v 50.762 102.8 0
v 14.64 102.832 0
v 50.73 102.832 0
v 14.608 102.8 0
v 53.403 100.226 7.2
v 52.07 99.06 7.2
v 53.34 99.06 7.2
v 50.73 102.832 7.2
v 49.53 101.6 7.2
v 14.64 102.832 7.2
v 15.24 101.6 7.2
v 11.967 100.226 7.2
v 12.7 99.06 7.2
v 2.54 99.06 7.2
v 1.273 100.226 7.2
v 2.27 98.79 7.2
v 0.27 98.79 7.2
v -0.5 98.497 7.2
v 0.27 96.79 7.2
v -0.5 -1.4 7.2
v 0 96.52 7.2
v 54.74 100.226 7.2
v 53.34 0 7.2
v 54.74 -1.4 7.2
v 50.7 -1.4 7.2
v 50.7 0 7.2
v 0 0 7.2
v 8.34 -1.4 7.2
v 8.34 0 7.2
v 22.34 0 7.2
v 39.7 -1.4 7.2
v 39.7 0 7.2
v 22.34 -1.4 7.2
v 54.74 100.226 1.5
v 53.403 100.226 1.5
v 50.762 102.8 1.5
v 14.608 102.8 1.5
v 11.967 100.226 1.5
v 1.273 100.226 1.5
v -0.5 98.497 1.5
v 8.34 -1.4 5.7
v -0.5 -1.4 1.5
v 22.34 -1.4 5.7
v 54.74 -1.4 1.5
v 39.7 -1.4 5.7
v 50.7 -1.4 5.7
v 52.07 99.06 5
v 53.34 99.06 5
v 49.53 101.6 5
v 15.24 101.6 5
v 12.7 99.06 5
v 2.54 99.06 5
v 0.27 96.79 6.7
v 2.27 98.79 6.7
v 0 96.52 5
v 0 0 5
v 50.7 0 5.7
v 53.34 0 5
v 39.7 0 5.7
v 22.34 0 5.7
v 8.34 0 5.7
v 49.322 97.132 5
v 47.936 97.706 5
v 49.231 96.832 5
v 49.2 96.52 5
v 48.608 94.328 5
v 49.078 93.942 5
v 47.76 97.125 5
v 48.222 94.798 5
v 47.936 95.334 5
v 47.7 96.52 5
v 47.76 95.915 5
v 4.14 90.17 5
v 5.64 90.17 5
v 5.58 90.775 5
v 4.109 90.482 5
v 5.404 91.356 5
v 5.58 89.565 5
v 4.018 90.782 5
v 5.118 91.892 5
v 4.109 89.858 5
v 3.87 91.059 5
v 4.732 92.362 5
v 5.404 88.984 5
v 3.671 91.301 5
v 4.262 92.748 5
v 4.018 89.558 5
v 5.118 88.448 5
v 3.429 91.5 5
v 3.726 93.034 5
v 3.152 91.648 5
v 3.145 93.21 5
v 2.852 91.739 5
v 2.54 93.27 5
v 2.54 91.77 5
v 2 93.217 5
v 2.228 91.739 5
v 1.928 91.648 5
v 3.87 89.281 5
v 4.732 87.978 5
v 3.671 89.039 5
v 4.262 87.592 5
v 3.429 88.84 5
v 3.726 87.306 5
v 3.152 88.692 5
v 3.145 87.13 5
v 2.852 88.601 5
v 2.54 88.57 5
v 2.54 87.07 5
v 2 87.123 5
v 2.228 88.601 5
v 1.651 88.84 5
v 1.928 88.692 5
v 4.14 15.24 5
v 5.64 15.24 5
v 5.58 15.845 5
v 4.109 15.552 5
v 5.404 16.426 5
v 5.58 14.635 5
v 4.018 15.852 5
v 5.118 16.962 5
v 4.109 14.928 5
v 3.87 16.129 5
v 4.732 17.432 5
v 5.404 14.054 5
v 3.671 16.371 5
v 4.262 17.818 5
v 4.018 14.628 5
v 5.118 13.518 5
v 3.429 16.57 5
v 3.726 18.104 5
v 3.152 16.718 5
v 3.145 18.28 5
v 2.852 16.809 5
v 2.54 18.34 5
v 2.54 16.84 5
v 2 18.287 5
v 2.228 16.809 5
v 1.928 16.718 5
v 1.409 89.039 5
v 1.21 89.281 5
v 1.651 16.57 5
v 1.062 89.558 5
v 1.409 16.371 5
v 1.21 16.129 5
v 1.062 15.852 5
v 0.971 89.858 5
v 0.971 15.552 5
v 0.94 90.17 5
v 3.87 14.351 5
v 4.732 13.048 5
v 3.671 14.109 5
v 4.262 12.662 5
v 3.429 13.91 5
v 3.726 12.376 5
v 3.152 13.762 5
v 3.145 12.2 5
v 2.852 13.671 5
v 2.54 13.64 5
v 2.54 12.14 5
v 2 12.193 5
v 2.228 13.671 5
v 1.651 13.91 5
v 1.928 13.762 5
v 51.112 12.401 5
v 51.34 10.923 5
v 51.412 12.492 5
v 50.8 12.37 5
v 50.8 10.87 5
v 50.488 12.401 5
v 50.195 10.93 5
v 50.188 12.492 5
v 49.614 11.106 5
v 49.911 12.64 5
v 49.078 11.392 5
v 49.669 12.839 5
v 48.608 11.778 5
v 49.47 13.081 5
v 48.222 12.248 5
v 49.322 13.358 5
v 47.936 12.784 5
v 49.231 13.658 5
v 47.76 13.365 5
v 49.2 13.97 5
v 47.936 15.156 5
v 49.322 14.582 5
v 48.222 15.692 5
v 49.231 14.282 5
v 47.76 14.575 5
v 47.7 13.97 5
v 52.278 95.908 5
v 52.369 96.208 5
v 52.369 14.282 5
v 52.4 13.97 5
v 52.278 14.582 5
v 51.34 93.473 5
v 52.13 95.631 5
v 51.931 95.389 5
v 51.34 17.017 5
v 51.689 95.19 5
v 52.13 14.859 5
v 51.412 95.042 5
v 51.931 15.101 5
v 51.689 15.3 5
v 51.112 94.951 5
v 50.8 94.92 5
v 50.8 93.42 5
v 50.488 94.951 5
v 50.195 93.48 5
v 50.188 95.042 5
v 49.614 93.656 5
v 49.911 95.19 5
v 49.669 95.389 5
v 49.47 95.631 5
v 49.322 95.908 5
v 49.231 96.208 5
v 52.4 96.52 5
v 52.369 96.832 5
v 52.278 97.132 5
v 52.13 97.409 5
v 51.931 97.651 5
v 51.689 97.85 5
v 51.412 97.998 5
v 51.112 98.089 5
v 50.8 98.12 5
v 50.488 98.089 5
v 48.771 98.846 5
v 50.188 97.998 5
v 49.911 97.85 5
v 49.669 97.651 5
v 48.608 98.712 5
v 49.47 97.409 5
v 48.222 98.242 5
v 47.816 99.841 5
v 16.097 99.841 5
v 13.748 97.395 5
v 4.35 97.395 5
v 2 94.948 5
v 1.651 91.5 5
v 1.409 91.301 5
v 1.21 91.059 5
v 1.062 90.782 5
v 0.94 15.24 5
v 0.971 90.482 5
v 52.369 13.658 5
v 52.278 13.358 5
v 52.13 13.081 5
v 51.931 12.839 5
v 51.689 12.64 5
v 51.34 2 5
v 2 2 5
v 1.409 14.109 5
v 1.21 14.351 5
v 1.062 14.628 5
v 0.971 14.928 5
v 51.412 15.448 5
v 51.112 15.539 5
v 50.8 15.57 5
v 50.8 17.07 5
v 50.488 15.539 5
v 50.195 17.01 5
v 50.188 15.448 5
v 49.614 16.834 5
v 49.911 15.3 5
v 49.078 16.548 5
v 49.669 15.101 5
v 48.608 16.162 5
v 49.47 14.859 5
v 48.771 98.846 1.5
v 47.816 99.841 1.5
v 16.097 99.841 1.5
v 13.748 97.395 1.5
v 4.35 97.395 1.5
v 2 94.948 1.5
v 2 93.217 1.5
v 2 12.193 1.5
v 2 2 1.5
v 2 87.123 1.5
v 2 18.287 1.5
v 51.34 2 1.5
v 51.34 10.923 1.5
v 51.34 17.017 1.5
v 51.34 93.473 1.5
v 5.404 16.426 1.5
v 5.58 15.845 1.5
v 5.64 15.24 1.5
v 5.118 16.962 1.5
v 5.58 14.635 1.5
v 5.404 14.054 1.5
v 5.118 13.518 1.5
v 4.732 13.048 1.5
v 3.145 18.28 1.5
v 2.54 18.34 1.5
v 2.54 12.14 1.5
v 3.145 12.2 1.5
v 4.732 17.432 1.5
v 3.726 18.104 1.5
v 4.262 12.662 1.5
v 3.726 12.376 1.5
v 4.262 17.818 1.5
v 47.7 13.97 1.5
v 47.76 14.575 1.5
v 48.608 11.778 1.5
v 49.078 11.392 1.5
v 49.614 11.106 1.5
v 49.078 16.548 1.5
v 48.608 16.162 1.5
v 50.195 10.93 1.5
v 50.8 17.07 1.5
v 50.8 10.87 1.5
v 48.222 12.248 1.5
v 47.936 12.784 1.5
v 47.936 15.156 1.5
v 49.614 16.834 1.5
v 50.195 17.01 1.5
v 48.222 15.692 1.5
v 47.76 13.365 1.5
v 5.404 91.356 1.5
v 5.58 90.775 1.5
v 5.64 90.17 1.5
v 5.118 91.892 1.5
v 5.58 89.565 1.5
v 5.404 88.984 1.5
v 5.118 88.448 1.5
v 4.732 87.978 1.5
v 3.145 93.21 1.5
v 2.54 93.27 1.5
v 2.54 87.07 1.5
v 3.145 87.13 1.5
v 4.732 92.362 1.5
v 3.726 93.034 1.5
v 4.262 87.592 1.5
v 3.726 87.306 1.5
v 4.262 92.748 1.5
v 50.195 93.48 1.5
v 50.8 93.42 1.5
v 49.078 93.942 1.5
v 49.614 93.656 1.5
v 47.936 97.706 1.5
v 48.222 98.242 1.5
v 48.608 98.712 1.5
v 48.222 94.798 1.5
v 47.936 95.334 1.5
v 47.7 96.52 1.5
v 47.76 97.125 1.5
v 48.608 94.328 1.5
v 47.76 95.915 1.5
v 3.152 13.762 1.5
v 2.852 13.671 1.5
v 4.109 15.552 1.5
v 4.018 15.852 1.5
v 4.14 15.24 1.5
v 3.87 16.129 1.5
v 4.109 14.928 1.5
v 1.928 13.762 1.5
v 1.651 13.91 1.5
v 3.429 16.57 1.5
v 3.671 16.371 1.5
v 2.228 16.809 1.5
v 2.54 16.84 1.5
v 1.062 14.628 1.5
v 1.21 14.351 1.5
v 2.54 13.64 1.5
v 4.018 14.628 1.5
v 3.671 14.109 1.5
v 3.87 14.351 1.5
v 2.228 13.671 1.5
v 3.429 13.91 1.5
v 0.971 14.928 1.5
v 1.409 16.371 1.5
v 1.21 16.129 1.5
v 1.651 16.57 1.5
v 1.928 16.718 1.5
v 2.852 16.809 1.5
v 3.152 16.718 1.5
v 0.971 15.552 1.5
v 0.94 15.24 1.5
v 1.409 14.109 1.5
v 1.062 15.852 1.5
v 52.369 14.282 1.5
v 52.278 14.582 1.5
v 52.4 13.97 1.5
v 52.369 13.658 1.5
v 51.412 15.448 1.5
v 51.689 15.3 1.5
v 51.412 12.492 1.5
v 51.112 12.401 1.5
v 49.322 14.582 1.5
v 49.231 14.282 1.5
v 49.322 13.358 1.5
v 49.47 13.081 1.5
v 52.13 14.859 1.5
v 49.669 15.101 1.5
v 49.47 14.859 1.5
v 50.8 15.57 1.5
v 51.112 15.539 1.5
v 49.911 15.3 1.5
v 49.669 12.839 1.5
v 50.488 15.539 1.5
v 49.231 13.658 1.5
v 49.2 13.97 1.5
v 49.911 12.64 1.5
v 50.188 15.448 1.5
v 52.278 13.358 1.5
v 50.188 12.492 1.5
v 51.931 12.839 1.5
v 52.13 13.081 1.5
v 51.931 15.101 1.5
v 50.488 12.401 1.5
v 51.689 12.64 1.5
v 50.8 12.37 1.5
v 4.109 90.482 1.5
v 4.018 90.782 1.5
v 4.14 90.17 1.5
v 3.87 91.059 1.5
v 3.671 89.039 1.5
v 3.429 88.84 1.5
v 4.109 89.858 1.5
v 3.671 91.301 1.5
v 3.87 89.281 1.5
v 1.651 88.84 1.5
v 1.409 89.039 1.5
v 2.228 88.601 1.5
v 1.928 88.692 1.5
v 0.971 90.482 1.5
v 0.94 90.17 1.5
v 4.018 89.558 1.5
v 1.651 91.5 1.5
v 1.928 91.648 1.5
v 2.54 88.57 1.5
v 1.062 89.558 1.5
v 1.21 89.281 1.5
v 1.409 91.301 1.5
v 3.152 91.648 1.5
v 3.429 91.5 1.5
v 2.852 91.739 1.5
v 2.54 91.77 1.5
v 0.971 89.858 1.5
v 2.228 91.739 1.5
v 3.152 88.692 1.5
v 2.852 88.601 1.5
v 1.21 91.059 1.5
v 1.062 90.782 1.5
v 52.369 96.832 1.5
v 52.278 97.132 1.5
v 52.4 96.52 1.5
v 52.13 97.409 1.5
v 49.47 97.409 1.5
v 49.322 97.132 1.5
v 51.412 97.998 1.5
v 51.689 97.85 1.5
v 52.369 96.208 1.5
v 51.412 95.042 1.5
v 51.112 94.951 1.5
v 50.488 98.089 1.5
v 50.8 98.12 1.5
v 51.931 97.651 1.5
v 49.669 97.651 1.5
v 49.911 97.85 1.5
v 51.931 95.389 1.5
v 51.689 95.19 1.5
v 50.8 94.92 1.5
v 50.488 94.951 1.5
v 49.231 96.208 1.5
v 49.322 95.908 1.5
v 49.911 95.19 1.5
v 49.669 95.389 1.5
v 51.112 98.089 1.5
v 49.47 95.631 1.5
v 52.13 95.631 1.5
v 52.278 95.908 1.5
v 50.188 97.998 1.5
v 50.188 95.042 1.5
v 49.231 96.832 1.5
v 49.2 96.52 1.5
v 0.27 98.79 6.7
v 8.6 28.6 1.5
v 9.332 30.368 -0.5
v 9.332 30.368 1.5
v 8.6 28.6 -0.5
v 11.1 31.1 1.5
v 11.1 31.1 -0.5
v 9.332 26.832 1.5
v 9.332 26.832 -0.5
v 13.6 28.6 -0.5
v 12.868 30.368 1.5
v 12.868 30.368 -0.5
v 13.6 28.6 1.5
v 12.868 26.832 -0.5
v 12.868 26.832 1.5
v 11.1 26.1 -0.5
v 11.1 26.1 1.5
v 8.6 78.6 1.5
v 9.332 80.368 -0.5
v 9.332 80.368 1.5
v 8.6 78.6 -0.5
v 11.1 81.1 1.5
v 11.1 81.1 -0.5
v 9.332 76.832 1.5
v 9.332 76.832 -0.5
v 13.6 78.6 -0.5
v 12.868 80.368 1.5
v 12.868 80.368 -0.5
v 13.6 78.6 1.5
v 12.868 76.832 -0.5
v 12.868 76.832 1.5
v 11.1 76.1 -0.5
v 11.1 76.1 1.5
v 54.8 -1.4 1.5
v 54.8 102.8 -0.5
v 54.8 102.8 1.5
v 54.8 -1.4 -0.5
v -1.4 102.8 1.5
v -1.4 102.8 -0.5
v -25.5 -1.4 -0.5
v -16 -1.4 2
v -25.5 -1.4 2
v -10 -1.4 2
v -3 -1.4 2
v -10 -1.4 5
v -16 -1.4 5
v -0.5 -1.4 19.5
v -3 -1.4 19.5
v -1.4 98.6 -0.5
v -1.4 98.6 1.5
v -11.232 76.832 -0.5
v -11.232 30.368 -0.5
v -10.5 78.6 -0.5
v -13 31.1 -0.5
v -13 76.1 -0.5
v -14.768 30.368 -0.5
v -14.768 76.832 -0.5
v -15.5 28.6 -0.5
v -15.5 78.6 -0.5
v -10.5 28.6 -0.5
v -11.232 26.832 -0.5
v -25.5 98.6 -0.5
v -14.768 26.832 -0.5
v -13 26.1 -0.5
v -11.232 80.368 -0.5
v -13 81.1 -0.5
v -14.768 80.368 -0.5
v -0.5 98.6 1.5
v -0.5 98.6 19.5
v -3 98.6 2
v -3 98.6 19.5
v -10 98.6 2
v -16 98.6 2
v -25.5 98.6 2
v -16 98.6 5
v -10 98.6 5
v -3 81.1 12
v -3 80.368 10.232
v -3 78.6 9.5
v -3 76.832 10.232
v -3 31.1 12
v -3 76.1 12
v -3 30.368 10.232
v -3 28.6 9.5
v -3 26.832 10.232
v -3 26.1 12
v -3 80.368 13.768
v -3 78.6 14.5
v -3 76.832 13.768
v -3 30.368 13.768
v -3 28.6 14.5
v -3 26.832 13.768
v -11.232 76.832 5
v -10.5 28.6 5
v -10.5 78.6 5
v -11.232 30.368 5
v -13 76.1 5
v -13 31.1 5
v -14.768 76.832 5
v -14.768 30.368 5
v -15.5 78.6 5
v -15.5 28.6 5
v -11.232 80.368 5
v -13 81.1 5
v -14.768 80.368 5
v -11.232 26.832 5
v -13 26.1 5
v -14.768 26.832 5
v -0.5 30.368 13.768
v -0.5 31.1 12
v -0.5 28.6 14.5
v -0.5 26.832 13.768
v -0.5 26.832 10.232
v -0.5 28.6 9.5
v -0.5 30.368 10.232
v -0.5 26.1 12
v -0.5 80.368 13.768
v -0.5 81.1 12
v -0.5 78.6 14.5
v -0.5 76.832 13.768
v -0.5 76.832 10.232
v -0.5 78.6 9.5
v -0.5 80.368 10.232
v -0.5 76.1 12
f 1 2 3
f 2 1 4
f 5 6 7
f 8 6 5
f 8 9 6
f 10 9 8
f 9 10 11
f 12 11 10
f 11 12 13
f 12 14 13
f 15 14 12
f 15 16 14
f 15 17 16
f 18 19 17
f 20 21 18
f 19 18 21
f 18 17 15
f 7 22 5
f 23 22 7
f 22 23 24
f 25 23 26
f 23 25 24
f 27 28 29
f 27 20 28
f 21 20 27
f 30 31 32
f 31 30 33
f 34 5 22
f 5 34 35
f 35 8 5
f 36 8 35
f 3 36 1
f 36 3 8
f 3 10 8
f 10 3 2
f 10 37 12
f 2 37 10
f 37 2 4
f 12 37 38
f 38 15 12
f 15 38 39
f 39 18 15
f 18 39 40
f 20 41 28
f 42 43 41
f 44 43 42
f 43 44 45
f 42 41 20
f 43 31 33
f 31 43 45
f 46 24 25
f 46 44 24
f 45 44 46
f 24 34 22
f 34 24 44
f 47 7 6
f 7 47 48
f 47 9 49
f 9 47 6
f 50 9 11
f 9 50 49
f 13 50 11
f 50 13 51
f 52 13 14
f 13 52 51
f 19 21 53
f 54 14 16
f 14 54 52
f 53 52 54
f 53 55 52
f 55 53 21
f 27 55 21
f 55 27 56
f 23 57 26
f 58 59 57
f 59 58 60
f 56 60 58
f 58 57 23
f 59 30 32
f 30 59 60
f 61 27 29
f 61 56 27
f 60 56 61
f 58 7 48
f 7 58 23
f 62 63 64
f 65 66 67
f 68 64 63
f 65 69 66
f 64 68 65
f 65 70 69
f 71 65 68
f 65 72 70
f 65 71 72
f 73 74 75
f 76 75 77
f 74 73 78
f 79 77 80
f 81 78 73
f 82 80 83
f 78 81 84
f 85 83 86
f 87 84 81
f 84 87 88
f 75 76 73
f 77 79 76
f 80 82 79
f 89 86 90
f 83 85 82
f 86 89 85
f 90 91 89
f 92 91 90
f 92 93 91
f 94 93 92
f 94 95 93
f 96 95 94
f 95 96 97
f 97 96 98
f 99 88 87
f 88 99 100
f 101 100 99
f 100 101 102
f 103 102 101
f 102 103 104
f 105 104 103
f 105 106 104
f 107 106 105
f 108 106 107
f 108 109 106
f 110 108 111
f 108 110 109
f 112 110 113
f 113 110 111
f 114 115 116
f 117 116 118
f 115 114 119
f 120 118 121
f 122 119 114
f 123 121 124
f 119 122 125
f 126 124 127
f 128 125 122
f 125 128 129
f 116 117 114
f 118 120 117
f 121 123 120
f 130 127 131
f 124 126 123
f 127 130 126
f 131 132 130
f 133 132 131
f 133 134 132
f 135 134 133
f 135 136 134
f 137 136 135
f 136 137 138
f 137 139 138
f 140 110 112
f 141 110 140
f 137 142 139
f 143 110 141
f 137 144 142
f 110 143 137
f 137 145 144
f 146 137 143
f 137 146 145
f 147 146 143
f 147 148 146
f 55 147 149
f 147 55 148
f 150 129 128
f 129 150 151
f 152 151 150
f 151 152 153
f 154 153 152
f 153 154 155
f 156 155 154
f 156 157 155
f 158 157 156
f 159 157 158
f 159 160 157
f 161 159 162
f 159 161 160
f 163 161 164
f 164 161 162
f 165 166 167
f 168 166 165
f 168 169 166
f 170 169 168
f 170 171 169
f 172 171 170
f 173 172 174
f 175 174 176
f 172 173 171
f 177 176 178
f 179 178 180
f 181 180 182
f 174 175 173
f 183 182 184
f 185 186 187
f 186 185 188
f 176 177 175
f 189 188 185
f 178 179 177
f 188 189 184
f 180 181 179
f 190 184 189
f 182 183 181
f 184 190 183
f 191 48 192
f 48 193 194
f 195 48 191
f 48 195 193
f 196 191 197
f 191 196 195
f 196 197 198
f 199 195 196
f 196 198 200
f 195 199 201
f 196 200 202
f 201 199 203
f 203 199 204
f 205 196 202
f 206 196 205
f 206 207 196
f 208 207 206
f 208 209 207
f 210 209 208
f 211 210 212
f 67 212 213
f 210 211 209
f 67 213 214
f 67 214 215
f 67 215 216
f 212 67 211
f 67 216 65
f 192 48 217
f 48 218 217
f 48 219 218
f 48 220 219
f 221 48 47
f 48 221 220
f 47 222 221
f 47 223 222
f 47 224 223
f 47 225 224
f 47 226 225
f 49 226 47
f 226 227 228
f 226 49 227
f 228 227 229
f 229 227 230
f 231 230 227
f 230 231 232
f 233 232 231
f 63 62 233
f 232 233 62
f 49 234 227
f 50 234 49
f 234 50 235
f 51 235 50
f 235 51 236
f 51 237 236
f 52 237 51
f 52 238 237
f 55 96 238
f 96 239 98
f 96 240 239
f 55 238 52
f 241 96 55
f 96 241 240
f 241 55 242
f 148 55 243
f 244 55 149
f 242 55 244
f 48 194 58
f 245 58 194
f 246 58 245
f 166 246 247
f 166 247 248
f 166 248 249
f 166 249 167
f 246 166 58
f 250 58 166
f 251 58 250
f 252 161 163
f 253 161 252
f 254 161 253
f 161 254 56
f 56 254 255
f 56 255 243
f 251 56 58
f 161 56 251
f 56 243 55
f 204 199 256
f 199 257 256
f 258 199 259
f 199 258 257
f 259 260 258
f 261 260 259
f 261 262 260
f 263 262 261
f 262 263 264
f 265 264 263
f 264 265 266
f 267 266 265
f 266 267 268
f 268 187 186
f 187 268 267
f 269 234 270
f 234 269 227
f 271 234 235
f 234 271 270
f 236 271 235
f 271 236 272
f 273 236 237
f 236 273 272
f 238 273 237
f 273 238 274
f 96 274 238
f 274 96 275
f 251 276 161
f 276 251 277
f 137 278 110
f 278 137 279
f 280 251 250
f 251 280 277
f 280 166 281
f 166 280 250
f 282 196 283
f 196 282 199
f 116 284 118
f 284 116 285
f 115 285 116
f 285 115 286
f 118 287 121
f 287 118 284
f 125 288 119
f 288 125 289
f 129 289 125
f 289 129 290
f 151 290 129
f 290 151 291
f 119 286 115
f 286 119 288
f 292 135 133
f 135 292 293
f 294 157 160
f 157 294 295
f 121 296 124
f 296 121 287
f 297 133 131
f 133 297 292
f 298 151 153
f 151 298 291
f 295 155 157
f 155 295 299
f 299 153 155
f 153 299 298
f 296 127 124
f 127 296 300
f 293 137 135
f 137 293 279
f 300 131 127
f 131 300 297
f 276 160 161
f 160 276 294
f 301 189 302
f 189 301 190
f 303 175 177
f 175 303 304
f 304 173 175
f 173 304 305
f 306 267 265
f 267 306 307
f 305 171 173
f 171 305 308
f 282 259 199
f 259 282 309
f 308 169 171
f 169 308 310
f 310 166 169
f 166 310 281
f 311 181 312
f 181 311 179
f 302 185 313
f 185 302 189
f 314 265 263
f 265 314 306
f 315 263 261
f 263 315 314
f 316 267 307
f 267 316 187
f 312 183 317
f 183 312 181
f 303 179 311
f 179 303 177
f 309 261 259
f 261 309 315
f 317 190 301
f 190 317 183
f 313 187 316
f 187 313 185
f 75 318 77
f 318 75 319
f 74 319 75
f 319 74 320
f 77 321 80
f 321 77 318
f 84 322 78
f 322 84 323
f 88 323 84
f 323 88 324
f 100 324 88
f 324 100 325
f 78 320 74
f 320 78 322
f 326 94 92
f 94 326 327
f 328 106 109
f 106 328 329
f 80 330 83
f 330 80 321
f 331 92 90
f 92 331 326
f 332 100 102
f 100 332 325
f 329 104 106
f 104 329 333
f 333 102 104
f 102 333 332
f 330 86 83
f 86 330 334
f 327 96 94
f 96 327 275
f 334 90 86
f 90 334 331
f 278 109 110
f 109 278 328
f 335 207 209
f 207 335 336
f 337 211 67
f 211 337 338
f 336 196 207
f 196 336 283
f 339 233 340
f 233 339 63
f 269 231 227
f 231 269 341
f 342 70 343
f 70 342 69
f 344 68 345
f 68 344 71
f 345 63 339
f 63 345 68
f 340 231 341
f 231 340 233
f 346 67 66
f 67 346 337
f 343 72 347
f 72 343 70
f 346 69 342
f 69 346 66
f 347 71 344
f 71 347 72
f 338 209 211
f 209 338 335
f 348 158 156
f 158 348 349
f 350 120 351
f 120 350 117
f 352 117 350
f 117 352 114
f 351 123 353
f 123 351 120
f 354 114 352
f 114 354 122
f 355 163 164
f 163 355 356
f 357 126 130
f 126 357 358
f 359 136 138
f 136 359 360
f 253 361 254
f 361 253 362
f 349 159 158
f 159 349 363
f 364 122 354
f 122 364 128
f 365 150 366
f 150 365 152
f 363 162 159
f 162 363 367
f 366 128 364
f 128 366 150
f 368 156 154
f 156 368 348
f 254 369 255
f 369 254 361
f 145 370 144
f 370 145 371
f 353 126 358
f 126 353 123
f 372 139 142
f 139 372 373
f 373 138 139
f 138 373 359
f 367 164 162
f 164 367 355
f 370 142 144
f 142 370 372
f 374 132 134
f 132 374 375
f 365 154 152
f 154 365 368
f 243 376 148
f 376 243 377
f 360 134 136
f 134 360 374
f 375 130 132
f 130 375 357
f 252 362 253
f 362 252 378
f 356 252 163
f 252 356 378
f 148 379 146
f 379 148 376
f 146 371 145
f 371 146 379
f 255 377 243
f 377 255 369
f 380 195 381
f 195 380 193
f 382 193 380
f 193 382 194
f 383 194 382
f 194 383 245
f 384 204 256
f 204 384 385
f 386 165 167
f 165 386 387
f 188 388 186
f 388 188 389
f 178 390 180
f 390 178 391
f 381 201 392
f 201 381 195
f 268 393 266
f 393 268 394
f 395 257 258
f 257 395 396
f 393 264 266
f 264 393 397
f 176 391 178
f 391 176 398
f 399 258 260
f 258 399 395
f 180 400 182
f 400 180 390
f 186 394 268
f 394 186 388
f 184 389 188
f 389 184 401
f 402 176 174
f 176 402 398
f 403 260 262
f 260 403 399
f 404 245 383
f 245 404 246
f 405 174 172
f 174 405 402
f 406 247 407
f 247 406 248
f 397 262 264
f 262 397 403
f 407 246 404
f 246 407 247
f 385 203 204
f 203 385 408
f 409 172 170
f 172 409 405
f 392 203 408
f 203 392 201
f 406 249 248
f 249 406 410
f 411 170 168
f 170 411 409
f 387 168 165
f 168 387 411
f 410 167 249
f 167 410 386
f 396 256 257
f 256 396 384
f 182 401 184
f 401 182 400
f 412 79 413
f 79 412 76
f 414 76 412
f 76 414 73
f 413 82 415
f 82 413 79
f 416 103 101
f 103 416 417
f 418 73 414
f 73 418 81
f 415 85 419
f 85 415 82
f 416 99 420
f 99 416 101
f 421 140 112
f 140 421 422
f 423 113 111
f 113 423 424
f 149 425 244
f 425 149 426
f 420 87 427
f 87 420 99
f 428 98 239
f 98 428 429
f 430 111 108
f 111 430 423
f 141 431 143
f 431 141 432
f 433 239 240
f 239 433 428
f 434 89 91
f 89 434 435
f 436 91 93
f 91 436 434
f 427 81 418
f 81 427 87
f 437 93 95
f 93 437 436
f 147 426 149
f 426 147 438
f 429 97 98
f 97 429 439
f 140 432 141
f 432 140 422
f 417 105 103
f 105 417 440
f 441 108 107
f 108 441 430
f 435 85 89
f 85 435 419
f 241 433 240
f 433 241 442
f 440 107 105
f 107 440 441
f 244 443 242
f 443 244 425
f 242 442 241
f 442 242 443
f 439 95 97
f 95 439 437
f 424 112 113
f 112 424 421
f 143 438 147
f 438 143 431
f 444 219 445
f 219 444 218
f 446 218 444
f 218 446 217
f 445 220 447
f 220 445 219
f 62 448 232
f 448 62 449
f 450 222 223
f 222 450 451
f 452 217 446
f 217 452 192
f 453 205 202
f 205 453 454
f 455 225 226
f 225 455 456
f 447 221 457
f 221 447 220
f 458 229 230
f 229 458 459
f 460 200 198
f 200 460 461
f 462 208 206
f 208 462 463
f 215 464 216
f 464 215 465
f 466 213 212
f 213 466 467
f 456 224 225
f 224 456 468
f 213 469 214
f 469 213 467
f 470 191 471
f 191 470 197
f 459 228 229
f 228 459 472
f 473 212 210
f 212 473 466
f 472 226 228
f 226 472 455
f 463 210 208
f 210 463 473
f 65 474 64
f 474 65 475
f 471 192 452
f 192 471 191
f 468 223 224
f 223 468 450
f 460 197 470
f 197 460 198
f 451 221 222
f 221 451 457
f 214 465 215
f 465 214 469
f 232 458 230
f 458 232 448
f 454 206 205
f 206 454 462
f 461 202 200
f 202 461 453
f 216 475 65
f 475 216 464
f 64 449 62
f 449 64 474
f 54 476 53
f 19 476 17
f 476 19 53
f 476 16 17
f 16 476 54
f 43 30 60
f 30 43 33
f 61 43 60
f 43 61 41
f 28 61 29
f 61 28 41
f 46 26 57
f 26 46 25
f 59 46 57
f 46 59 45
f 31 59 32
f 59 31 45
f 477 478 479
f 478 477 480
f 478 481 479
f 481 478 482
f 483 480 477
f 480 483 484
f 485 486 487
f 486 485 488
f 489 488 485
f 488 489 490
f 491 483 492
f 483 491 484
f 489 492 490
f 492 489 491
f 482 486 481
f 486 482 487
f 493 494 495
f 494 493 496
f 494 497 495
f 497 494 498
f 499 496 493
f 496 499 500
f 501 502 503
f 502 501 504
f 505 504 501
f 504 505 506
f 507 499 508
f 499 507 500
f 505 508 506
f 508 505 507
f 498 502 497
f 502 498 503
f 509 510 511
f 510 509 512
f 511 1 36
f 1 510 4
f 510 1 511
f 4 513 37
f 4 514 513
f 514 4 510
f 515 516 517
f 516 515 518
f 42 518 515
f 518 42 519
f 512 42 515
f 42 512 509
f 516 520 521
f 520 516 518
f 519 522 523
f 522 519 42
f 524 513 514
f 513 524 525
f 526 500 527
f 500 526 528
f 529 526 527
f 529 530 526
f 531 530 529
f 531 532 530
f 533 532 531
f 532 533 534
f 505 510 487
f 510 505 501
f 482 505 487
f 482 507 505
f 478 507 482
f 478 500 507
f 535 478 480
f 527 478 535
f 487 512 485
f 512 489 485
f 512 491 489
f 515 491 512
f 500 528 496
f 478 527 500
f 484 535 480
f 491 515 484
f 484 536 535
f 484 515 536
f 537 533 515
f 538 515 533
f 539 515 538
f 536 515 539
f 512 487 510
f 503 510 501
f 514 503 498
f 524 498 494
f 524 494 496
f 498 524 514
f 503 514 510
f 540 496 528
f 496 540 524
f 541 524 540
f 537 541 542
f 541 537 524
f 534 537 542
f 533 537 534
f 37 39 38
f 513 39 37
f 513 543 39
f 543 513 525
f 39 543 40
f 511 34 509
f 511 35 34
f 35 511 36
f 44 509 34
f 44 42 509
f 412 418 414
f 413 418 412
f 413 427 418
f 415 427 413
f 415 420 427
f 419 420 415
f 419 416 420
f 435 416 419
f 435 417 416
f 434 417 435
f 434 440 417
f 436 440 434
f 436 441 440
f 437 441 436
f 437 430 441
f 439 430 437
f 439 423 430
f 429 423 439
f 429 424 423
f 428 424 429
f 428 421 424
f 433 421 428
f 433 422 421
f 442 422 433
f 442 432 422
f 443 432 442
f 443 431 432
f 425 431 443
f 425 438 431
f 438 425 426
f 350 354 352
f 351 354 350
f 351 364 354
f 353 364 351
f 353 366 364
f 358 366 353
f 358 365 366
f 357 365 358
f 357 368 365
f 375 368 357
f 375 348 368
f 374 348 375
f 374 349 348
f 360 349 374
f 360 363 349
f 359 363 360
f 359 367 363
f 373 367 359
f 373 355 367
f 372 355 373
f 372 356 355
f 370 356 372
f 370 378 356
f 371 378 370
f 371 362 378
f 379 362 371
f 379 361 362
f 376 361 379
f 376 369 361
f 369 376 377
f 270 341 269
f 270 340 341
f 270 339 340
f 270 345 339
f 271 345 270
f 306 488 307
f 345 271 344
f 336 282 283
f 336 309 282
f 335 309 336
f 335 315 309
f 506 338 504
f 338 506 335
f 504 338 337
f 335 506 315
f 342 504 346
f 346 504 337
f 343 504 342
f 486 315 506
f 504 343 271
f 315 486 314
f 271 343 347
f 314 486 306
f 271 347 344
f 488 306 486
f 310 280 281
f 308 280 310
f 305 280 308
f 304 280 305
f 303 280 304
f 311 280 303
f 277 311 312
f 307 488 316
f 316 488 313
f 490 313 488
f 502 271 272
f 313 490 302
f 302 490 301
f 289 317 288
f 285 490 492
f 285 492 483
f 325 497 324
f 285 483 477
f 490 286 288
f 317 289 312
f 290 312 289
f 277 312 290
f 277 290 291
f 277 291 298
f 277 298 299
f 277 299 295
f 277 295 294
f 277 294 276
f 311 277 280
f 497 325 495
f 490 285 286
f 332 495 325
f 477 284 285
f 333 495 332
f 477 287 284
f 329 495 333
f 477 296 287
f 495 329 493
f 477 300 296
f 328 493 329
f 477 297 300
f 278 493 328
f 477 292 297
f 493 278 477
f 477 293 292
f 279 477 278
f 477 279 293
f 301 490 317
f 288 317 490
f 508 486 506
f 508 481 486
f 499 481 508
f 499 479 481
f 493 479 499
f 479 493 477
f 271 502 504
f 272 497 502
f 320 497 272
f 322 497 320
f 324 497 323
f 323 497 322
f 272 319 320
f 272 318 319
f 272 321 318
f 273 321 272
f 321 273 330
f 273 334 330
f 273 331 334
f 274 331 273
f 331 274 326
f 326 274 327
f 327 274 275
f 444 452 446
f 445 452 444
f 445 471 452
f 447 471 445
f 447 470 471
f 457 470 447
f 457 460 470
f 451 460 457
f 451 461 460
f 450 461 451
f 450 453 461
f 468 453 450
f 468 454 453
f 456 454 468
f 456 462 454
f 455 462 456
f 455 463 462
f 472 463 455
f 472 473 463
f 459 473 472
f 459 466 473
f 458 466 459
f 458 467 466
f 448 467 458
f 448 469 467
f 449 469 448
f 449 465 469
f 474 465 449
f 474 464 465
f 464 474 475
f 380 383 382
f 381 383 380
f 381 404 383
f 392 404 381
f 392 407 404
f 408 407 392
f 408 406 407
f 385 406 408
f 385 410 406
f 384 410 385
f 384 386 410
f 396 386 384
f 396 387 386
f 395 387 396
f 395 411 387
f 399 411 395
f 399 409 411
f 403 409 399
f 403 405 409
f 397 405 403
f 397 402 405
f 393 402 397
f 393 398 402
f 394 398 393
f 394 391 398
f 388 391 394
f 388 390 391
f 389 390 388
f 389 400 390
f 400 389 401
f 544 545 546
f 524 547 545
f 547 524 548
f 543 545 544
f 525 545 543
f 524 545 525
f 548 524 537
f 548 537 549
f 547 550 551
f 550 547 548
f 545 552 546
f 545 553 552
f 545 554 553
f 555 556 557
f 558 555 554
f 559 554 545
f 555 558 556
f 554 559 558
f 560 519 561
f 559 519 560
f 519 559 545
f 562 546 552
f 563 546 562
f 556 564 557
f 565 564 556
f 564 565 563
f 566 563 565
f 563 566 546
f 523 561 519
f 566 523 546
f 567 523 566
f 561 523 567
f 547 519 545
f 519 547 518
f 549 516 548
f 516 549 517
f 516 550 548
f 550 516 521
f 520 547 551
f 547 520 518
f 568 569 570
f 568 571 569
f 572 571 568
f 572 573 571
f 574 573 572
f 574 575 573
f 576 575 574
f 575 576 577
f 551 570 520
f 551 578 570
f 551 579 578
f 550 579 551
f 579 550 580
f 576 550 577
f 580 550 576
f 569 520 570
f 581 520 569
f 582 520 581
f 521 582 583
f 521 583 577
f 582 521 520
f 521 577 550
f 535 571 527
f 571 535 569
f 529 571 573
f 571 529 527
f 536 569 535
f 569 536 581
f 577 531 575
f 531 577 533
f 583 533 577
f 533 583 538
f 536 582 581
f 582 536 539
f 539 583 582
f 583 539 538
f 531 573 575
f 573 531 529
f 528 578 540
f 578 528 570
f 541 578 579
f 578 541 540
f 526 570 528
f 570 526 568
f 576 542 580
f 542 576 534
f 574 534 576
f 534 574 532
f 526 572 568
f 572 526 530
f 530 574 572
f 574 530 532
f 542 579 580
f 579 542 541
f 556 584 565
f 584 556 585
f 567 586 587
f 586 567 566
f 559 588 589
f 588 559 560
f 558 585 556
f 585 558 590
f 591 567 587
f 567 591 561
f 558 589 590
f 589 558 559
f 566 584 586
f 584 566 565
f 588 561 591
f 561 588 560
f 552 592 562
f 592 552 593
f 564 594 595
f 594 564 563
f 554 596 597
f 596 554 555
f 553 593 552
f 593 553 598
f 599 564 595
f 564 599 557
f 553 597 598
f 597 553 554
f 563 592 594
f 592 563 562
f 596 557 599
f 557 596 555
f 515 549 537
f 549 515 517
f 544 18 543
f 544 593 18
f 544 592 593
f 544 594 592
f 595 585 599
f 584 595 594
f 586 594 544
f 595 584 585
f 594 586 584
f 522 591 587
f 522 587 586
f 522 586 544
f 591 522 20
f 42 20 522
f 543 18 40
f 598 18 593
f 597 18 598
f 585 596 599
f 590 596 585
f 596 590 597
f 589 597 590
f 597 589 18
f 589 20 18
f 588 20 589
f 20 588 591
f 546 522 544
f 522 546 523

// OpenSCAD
// file: inc/pins.scad
// Pin Connectors V3
// Tony Buser <tbuser@gmail.com>
// Modified by Emmett Lalish

object=0;//[0:pin,1:pinpeg,2:pinhole]
length=20;
diameter=8;
//Only affects pinhole
hole_twist=0;//[0:free,1:fixed]
//Only affects pinhole
hole_friction=0;//[0:loose,1:tight]
//Radial gap to help pins fit into tight holes
pin_tolerance=0.2;
//Extra gap to make loose hole
loose=0.3;
lip_height=3;
lip_thickness=1;
hf=hole_friction==0 ? false : true;
ht=hole_twist==0 ? false : true;

if(object==0)pin(h=length,r=diameter/2,lh=lip_height,lt=lip_thickness,t=pin_tolerance);
if(object==1)pinpeg(h=length,r=diameter/2,lh=lip_height,lt=lip_thickness,t=pin_tolerance);
if(object==2)pinhole(h=length,r=diameter/2,lh=lip_height,lt=lip_thickness,t=loose,
	tight=hf,fixed=ht);

module test() {
  tolerance = 0.3;
  
  translate([-12, 12, 0]) pinpeg(h=20);
  translate([12, 12, 0]) pintack(h=10);
  
  difference() {
    union() {
      translate([0, -12, 2.5]) cube(size = [59, 20, 5], center = true);
      translate([24, -12, 7.5]) cube(size = [12, 20, 15], center = true);
    }
    translate([-24, -12, 0]) pinhole(h=5, t=tolerance);
    translate([-12, -12, 0]) pinhole(h=5, t=tolerance, tight=false);
    translate([0, -12, 0]) pinhole(h=10, t=tolerance);
    translate([12, -12, 0]) pinhole(h=10, t=tolerance, tight=false);
    translate([24, -12, 15]) rotate([0, 180, 0]) pinhole(h=10, t=tolerance);
  }
}

module pinhole(h=10, r=4, lh=3, lt=1, t=0.3, tight=true, fixed=false) {
  // h = shaft height
  // r = shaft radius
  // lh = lip height
  // lt = lip thickness
  // t = extra tolerance for loose fit
  // tight = set to false if you want a joint that spins easily
  // fixed = set to true so pins can't spin
  
intersection(){
  union() {
	if (tight == true || fixed == true) {
      pin_solid(h, r, lh, lt);
	  translate([0,0,-t/2])cylinder(h=h+t, r=r, $fn=30);
	} else {
	  pin_solid(h, r+t/2, lh, lt);
	  translate([0,0,-t/2])cylinder(h=h+t, r=r+t/2, $fn=30);
	}
    
    
    // widen the entrance hole to make insertion easier
    //translate([0, 0, -0.1]) cylinder(h=lh/3, r2=r, r1=r+(t/2)+(lt/2),$fn=30);
  }
  if (fixed == true) {
	translate([-r*2, -r*0.75, -1])cube([r*4, r*1.5, h+2]);
  }
}}

module pin(h=10, r=4, lh=3, lt=1, t=0.2, side=false) {
  // h = shaft height
  // r = shaft radius
  // lh = lip height
  // lt = lip thickness
  // side = set to true if you want it printed horizontally

  if (side) {
    pin_horizontal(h, r, lh, lt, t);
  } else {
    //pin_vertical(h, r, lh, lt, t);
  }
}

module pintack(h=10, r=4, lh=3, lt=1, t=0.2, bh=3, br=8.75) {
  // bh = base_height
  // br = base_radius
  
  union() {
    cylinder(h=bh, r=br);
    translate([0, 0, bh]) pin(h, r, lh, lt, t);
  }
}

module pinpeg(h=20, r=4, lh=3, lt=1, t=0.2) {
  union() {
    translate([0,-0.05, 0]) pin(h/2+0.1, r, lh, lt, t, side=true);
    translate([0,0.05, 0]) rotate([0, 0, 180]) pin(h/2+0.1, r, lh, lt, t, side=true);
  }
}

// just call pin instead, I made this module because it was easier to do the rotation option this way
// since openscad complains of recursion if I did it all in one module
module pin_vertical(h=10, r=4, lh=3, lt=1, t=0.2) {
  // h = shaft height
  // r = shaft radius
  // lh = lip height
  // lt = lip thickness

  difference() {
    pin_solid(h, r-t/2, lh, lt);
    
    // center cut
    translate([-lt*3/2, -(r*2+lt*2)/2, h/5+lt*3/2]) cube([lt*3, r*2+lt*2, h]);
    //translate([0, 0, h/4]) cylinder(h=h+lh, r=r/2.5, $fn=20);
    // center curve
    translate([0, 0, h/5+lt*3/2]) rotate([90, 0, 0]) cylinder(h=r*2, r=lt*3/2, center=true, $fn=20);
  
    // side cuts
    translate([-r*2, -r-r*0.75+t/2, -1]) cube([r*4, r, h+2]);
    translate([-r*2, r*0.75-t/2, -1]) cube([r*4, r, h+2]);
  }
}

// call pin with side=true instead of this
module pin_horizontal(h=10, r=4, lh=3, lt=1, t=0.2) {
  // h = shaft height
  // r = shaft radius
  // lh = lip height
  // lt = lip thickness
  translate([0, 0, r*0.75-t/2]) rotate([-90, 0, 0]) pin_vertical(h, r, lh, lt, t);
}

// this is mainly to make the pinhole module easier
module pin_solid(h=10, r=4, lh=3, lt=1) {
  union() {
    // shaft
    cylinder(h=h-lh, r=r, $fn=30);
    // lip
    // translate([0, 0, h-lh]) cylinder(h=lh*0.25, r1=r, r2=r+(lt/2), $fn=30);
    // translate([0, 0, h-lh+lh*0.25]) cylinder(h=lh*0.25, r2=r, r1=r+(lt/2), $fn=30);
    // translate([0, 0, h-lh+lh*0.50]) cylinder(h=lh*0.50, r1=r, r2=r-(lt/2), $fn=30);

    // translate([0, 0, h-lh]) cylinder(h=lh*0.50, r1=r, r2=r+(lt/2), $fn=30);
    // translate([0, 0, h-lh+lh*0.50]) cylinder(h=lh*0.50, r1=r+(lt/2), r2=r-(lt/3), $fn=30);    

    translate([0, 0, h-lh]) cylinder(h=lh*0.25, r1=r, r2=r+(lt/2), $fn=30);
    translate([0, 0, h-lh+lh*0.25]) cylinder(h=lh*0.25, r=r+(lt/2), $fn=30);    
    translate([0, 0, h-lh+lh*0.50]) cylinder(h=lh*0.50, r1=r+(lt/2), r2=r-(lt/2), $fn=30);    

    // translate([0, 0, h-lh]) cylinder(h=lh, r1=r+(lt/2), r2=1, $fn=30);
    // translate([0, 0, h-lh-lt/2]) cylinder(h=lt/2, r1=r, r2=r+(lt/2), $fn=30);
  }
}

module pinshaft(h=10, r=4, t=0.2, side=false){
flip=side ? 1 : 0;
translate(flip*[0,h/2,r*0.75-t/2])rotate(flip*[90,0,0])
intersection(){
	cylinder(h=h, r=r-t/2, $fn=30);
	translate([-r*2, -r*0.75+t/2, -1])cube([r*4, r*1.5-t, h+2]);
}
}
// file: inc/functions.scad
// PRUSA iteration3
// Functions used in many files
// GNU GPL v3
// Josef Průša <josefprusa@me.com>
// Václav 'ax' Hůla <axtheb@gmail.com>
// Vlnofka <>
// http://www.reprap.org/wiki/Prusa_Mendel
// http://github.com/josefprusa/Prusa3


module nut(d,h,horizontal=true){
    cornerdiameter =  (d / 2) / cos (180 / 6);
    cylinder(h = h, r = cornerdiameter, $fn = 6);
    if(horizontal){
        for(i = [1:6]){
            rotate([0,0,60*i]) translate([-cornerdiameter-0.2,0,0]) rotate([0,0,-45]) cube([2,2,h]);
        }
    }
}

module fillet(radius, height=100, $fn=0) {
    //this creates acutal fillet
    translate([-radius, -radius, -height / 2 - 0.02]) difference() {
        cube([radius * 2, radius * 2, height + 0.04]);
        if ($fn == 0 && (radius == 2 || radius == 3 || radius == 4)) {
            cylinder(r=radius, h=height + 0.04, $fn=4 * radius);
        } else {
            cylinder(r=radius, h=height + 0.04, $fn=$fn);
        }

    }
}

module cube_fillet(size, radius=-1, vertical=[3,3,3,3], top=[0,0,0,0], bottom=[0,0,0,0], center=false, $fn=0){
    //
    if (use_fillets == 1) {
        if (center) {
            cube_fillet_inside(size, radius, vertical, top, bottom, $fn);
        } else {
            translate([size[0]/2, size[1]/2, size[2]/2])
                cube_fillet_inside(size, radius, vertical, top, bottom, $fn);
        }
    } else {
        if (use_fillets == 2) {
            if (center) {
                cube_fillet_inside(size, radius, vertical, top, bottom, 4);
            } else {
                translate([size[0]/2, size[1]/2, size[2]/2])
                    cube_fillet_inside(size, radius, vertical, top, bottom, 4);
            }

        } else {
            cube(size, center);
        }
    }

}

module cube_negative_fillet(size, radius=-1, vertical=[3,3,3,3], top=[0,0,0,0], bottom=[0,0,0,0], $fn=0){

    j=[1,0,1,0];

    for (i=[0:3]) {
        if (radius > -1) {
            rotate([0, 0, 90*i]) translate([size[1-j[i]]/2, size[j[i]]/2, 0]) fillet(radius, size[2], $fn=$fn);
        } else {
            rotate([0, 0, 90*i]) translate([size[1-j[i]]/2, size[j[i]]/2, 0]) fillet(vertical[i], size[2], $fn=$fn);
        }
        rotate([90*i, -90, 0]) translate([size[2]/2, size[j[i]]/2, 0 ]) fillet(top[i], size[1-j[i]], $fn=$fn);
        rotate([90*(4-i), 90, 0]) translate([size[2]/2, size[j[i]]/2, 0]) fillet(bottom[i], size[1-j[i]], $fn=$fn);

    }
}

module cube_fillet_inside(size, radius=-1, vertical=[3,3,3,3], top=[0,0,0,0], bottom=[0,0,0,0], $fn=0){
    //makes CENTERED cube with round corners
    // if you give it radius, it will fillet vertical corners.
    //othervise use vertical, top, bottom arrays
    //when viewed from top, it starts in upper right corner (+x,+y quadrant) , goes counterclockwise
    //top/bottom fillet starts in direction of Y axis and goes CCW too


    if (radius == 0) {
        cube(size, center=true);
    } else {
        difference() {
            cube(size, center=true);
            cube_negative_fillet(size, radius, vertical, top, bottom, $fn);
        }
    }
}


module nema17(places=[1,1,1,1], size=15.5, h=10, holes=false, shadow=false, $fn=24){
    for (i=[0:3]) {
        if (places[i] == 1) {
            rotate([0, 0, 90*i]) translate([size, size, 0]) {
                if (holes) {
                    rotate([0, 0, -90*i])  translate([0,0,-10]) screw(r=1.7, slant=false, head_drop=13, $fn=$fn, h=h+12);
                } else {
                    rotate([0, 0, -90*i]) cylinder(h=h, r=5.5, $fn=$fn);
                }
            }
        }
    }
    if (shadow != false) {
        %translate ([0, 0, shadow+21+3]) cube([42,42,42], center = true);
    //flange
        %translate ([0, 0, shadow+21+3-21-1]) cylinder(r=11,h=2, center = true, $fn=20);
    //shaft
        %translate ([0, 0, shadow+21+3-21-7]) cylinder(r=2.5,h=14, center = true);
    }
}

module screw(h=20, r=2, r_head=3.5, head_drop=0, slant=i_am_box, poly=false, $fn=0){
    //makes screw with head
    //for substraction as screw hole
    if (poly) {
        cylinder_poly(h=h, r=r, $fn=$fn);
    } else {
        cylinder(h=h, r=r, $fn=$fn);
    }
    if (slant) {
        translate([0, 0, head_drop-0.01]) cylinder(h=r_head, r2=0, r1=r_head, $fn=$fn);
    }

    if (head_drop > 0) {
        translate([0, 0, -0.01]) cylinder(h=head_drop+0.01, r=r_head, $fn=$fn);
    }
}

module plate_screw(long=0) {
    if (i_am_box == 0) {
        translate([0, 0, -long]) screw(head_drop=14 + long, h=30 + long, r_head=3.6, r=1.7, $fn=24, slant=false);
    } else {
        translate([0, 0, -2 - long]) screw(head_drop=14 + long, h=30 + long, r_head=4.5, r=2, $fn=24, slant=true);
    }
}

//radius of the idler assembly (to surface that touches belt, ignoring guide walls)
function idler_assy_r_inner(idler_bearing) = (idler_bearing[0] / 2) + (6 * single_wall_width + 0.2) * idler_bearing[3];
//outer radius of the idler assembly (to smooth side of belt) 
function idler_assy_r_outer(idler_bearing) = idler_assy_r_inner(idler_bearing) + belt_thickness + 1;

module ext2020(l=20) {
  translate([0,0,l/2])
  difference(){
    cube([20,20,l], center=true);
    translate([10-1.5,0,0])cube([3,6,l], center=true);
    translate([-10+1.5,0,0])cube([3,6,l], center=true);
    translate([0,10-1.5,0])cube([6,3,l], center=true);
    translate([0,-10+1.5,0])cube([6,3,l], center=true);
  }
}

module idler_assy(idler_bearing = [22, 7, 8, 1]) {

    //bearing axle
    translate([0,0,-1]) cylinder(h = 120, r=(idler_bearing[2] + 1) / 2, $fn=small_hole_segments, center=true);
    //bearing shadow
    %cylinder(h = idler_bearing[1], r=idler_bearing[0]/2, center=true);
    //belt shadow
    %cylinder(h = belt_width, r=idler_assy_r_outer(idler_bearing), center=true);

    cylinder(h = idler_width + 1, r=idler_assy_r_outer(idler_bearing) + 0.5, center=true);
}

module belt(len, side = 0){
    //belt. To be substracted from model
    //len is in +Z, smooth side in +X, Y centered
    translate([-0.5, 0, 0]) maketeeth(len);
    translate([0, -4.5, -0.01]) cube([belt_thickness, 9, len + 0.02]);
    if (side != 0) {
    translate([0, -4.5 + side, -0.01]) cube_fillet([belt_thickness, 9, len + 0.02], vertical = [3, 0, 0, 0]);
    }
}


module maketeeth(len){
    //Belt teeth. 
    for (i = [0 : len / belt_tooth_distance]) {
        translate([0, 0, i * belt_tooth_distance]) cube([2, 9, belt_tooth_distance * belt_tooth_ratio], center = true);
    }
}
// file: inc/frame_hold1.scad
use<functions.scad>
include<arduino.scad>

module base_plate() {
  translate([11.1,-1.4,-11.5])rotate([-90,0,0])
  {
    difference() 
    {
      union() {
        translate([15.60,-12,(104.2/2)])cube([56.2,2,104.2],center=true);
      }
      ext2020(l=100);
      for (i = [30, 80]) 
        translate([0,0,i])rotate([0,-90,90])cylinder(r=2.5,h=30);
      for (i = [30, 80]) 
        translate([0,0,i])rotate([0,-90,0])cylinder(r=2.5,h=30);

      translate([6,6,120/2])cube([25,25,120],center=true);
      translate([0,20,120/2])cube([25,25,120],center=true);
      translate([10.6,2.5,120/2])cube([6,25,120],center=true);
    }
  }
}
module corner_brace(nosupport=false) {
      difference() 
      {
        union() {
          translate([0,0,(100/2)])cube([25,25,100],center=true);
        }
        ext2020(l=100);
        if (nosupport)
        {
          translate([0,0,100/2])

            translate([-10+1.5,0,0])cube([3,6,100], center=true);
            translate([10-1.5,0,0])cube([3,6,100], center=true);
        }

        for (i = [30, 80]) 
          translate([0,0,i])rotate([0,-90,90])cylinder(r=2.5,h=30);
        for (i = [30, 80]) 
          translate([0,0,i])rotate([0,-90,0])cylinder(r=2.5,h=30);

        translate([6,6,120/2])cube([25,25,120],center=true);
        translate([0,20,120/2])cube([25,25,120],center=true);
        translate([10.6,2.5,120/2])cube([6,25,120],center=true);
      }
}
module frame_mount(corner_brace=false,enclosure=true,nosupport=false) 
{
  if(enclosure)
  {
    difference(){
      translate([0,0,-0.5])enclosure(boardType=MEGA2560, mountingHoles=false);
      translate([-50,-50,20])cube(500,500,500);
      translate([0,0,25])enclosure(boardType=MEGA2560, mountingHoles=false);
      translate([11.1,-1.4,-11.5])rotate([-90,0,0])
        translate([15.60,-12,(104.2/2)])cube([56.2,4,104.2],center=true);

      translate([-11,-1.4,12])rotate([-90,180,0])
      {
        for (i = [30, 80]) 
          translate([0,0,i])rotate([0,-90,90])cylinder(r=2.5,h=30);
        for (i = [30, 80]) 
          translate([0,0,i])rotate([0,-90,0])cylinder(r=2.5,h=30);

      }
        

    }

  }else{
    bumper(boardType=MEGA2560, mountingHoles=false);
  }
  base_plate();


  if (corner_brace) { 
    if (enclosure) {
      translate([-16,-1.4,12])rotate([-90,180,0])
        corner_brace(nosupport);
    } else {
      translate([-13,-1.4,12])rotate([-90,180,0])
        corner_brace(nosupport);
    }
  }
}
// main file
include<inc/frame_hold1.scad>
frame_mount(corner_brace=true,enclosure=false,nosupport=true);
